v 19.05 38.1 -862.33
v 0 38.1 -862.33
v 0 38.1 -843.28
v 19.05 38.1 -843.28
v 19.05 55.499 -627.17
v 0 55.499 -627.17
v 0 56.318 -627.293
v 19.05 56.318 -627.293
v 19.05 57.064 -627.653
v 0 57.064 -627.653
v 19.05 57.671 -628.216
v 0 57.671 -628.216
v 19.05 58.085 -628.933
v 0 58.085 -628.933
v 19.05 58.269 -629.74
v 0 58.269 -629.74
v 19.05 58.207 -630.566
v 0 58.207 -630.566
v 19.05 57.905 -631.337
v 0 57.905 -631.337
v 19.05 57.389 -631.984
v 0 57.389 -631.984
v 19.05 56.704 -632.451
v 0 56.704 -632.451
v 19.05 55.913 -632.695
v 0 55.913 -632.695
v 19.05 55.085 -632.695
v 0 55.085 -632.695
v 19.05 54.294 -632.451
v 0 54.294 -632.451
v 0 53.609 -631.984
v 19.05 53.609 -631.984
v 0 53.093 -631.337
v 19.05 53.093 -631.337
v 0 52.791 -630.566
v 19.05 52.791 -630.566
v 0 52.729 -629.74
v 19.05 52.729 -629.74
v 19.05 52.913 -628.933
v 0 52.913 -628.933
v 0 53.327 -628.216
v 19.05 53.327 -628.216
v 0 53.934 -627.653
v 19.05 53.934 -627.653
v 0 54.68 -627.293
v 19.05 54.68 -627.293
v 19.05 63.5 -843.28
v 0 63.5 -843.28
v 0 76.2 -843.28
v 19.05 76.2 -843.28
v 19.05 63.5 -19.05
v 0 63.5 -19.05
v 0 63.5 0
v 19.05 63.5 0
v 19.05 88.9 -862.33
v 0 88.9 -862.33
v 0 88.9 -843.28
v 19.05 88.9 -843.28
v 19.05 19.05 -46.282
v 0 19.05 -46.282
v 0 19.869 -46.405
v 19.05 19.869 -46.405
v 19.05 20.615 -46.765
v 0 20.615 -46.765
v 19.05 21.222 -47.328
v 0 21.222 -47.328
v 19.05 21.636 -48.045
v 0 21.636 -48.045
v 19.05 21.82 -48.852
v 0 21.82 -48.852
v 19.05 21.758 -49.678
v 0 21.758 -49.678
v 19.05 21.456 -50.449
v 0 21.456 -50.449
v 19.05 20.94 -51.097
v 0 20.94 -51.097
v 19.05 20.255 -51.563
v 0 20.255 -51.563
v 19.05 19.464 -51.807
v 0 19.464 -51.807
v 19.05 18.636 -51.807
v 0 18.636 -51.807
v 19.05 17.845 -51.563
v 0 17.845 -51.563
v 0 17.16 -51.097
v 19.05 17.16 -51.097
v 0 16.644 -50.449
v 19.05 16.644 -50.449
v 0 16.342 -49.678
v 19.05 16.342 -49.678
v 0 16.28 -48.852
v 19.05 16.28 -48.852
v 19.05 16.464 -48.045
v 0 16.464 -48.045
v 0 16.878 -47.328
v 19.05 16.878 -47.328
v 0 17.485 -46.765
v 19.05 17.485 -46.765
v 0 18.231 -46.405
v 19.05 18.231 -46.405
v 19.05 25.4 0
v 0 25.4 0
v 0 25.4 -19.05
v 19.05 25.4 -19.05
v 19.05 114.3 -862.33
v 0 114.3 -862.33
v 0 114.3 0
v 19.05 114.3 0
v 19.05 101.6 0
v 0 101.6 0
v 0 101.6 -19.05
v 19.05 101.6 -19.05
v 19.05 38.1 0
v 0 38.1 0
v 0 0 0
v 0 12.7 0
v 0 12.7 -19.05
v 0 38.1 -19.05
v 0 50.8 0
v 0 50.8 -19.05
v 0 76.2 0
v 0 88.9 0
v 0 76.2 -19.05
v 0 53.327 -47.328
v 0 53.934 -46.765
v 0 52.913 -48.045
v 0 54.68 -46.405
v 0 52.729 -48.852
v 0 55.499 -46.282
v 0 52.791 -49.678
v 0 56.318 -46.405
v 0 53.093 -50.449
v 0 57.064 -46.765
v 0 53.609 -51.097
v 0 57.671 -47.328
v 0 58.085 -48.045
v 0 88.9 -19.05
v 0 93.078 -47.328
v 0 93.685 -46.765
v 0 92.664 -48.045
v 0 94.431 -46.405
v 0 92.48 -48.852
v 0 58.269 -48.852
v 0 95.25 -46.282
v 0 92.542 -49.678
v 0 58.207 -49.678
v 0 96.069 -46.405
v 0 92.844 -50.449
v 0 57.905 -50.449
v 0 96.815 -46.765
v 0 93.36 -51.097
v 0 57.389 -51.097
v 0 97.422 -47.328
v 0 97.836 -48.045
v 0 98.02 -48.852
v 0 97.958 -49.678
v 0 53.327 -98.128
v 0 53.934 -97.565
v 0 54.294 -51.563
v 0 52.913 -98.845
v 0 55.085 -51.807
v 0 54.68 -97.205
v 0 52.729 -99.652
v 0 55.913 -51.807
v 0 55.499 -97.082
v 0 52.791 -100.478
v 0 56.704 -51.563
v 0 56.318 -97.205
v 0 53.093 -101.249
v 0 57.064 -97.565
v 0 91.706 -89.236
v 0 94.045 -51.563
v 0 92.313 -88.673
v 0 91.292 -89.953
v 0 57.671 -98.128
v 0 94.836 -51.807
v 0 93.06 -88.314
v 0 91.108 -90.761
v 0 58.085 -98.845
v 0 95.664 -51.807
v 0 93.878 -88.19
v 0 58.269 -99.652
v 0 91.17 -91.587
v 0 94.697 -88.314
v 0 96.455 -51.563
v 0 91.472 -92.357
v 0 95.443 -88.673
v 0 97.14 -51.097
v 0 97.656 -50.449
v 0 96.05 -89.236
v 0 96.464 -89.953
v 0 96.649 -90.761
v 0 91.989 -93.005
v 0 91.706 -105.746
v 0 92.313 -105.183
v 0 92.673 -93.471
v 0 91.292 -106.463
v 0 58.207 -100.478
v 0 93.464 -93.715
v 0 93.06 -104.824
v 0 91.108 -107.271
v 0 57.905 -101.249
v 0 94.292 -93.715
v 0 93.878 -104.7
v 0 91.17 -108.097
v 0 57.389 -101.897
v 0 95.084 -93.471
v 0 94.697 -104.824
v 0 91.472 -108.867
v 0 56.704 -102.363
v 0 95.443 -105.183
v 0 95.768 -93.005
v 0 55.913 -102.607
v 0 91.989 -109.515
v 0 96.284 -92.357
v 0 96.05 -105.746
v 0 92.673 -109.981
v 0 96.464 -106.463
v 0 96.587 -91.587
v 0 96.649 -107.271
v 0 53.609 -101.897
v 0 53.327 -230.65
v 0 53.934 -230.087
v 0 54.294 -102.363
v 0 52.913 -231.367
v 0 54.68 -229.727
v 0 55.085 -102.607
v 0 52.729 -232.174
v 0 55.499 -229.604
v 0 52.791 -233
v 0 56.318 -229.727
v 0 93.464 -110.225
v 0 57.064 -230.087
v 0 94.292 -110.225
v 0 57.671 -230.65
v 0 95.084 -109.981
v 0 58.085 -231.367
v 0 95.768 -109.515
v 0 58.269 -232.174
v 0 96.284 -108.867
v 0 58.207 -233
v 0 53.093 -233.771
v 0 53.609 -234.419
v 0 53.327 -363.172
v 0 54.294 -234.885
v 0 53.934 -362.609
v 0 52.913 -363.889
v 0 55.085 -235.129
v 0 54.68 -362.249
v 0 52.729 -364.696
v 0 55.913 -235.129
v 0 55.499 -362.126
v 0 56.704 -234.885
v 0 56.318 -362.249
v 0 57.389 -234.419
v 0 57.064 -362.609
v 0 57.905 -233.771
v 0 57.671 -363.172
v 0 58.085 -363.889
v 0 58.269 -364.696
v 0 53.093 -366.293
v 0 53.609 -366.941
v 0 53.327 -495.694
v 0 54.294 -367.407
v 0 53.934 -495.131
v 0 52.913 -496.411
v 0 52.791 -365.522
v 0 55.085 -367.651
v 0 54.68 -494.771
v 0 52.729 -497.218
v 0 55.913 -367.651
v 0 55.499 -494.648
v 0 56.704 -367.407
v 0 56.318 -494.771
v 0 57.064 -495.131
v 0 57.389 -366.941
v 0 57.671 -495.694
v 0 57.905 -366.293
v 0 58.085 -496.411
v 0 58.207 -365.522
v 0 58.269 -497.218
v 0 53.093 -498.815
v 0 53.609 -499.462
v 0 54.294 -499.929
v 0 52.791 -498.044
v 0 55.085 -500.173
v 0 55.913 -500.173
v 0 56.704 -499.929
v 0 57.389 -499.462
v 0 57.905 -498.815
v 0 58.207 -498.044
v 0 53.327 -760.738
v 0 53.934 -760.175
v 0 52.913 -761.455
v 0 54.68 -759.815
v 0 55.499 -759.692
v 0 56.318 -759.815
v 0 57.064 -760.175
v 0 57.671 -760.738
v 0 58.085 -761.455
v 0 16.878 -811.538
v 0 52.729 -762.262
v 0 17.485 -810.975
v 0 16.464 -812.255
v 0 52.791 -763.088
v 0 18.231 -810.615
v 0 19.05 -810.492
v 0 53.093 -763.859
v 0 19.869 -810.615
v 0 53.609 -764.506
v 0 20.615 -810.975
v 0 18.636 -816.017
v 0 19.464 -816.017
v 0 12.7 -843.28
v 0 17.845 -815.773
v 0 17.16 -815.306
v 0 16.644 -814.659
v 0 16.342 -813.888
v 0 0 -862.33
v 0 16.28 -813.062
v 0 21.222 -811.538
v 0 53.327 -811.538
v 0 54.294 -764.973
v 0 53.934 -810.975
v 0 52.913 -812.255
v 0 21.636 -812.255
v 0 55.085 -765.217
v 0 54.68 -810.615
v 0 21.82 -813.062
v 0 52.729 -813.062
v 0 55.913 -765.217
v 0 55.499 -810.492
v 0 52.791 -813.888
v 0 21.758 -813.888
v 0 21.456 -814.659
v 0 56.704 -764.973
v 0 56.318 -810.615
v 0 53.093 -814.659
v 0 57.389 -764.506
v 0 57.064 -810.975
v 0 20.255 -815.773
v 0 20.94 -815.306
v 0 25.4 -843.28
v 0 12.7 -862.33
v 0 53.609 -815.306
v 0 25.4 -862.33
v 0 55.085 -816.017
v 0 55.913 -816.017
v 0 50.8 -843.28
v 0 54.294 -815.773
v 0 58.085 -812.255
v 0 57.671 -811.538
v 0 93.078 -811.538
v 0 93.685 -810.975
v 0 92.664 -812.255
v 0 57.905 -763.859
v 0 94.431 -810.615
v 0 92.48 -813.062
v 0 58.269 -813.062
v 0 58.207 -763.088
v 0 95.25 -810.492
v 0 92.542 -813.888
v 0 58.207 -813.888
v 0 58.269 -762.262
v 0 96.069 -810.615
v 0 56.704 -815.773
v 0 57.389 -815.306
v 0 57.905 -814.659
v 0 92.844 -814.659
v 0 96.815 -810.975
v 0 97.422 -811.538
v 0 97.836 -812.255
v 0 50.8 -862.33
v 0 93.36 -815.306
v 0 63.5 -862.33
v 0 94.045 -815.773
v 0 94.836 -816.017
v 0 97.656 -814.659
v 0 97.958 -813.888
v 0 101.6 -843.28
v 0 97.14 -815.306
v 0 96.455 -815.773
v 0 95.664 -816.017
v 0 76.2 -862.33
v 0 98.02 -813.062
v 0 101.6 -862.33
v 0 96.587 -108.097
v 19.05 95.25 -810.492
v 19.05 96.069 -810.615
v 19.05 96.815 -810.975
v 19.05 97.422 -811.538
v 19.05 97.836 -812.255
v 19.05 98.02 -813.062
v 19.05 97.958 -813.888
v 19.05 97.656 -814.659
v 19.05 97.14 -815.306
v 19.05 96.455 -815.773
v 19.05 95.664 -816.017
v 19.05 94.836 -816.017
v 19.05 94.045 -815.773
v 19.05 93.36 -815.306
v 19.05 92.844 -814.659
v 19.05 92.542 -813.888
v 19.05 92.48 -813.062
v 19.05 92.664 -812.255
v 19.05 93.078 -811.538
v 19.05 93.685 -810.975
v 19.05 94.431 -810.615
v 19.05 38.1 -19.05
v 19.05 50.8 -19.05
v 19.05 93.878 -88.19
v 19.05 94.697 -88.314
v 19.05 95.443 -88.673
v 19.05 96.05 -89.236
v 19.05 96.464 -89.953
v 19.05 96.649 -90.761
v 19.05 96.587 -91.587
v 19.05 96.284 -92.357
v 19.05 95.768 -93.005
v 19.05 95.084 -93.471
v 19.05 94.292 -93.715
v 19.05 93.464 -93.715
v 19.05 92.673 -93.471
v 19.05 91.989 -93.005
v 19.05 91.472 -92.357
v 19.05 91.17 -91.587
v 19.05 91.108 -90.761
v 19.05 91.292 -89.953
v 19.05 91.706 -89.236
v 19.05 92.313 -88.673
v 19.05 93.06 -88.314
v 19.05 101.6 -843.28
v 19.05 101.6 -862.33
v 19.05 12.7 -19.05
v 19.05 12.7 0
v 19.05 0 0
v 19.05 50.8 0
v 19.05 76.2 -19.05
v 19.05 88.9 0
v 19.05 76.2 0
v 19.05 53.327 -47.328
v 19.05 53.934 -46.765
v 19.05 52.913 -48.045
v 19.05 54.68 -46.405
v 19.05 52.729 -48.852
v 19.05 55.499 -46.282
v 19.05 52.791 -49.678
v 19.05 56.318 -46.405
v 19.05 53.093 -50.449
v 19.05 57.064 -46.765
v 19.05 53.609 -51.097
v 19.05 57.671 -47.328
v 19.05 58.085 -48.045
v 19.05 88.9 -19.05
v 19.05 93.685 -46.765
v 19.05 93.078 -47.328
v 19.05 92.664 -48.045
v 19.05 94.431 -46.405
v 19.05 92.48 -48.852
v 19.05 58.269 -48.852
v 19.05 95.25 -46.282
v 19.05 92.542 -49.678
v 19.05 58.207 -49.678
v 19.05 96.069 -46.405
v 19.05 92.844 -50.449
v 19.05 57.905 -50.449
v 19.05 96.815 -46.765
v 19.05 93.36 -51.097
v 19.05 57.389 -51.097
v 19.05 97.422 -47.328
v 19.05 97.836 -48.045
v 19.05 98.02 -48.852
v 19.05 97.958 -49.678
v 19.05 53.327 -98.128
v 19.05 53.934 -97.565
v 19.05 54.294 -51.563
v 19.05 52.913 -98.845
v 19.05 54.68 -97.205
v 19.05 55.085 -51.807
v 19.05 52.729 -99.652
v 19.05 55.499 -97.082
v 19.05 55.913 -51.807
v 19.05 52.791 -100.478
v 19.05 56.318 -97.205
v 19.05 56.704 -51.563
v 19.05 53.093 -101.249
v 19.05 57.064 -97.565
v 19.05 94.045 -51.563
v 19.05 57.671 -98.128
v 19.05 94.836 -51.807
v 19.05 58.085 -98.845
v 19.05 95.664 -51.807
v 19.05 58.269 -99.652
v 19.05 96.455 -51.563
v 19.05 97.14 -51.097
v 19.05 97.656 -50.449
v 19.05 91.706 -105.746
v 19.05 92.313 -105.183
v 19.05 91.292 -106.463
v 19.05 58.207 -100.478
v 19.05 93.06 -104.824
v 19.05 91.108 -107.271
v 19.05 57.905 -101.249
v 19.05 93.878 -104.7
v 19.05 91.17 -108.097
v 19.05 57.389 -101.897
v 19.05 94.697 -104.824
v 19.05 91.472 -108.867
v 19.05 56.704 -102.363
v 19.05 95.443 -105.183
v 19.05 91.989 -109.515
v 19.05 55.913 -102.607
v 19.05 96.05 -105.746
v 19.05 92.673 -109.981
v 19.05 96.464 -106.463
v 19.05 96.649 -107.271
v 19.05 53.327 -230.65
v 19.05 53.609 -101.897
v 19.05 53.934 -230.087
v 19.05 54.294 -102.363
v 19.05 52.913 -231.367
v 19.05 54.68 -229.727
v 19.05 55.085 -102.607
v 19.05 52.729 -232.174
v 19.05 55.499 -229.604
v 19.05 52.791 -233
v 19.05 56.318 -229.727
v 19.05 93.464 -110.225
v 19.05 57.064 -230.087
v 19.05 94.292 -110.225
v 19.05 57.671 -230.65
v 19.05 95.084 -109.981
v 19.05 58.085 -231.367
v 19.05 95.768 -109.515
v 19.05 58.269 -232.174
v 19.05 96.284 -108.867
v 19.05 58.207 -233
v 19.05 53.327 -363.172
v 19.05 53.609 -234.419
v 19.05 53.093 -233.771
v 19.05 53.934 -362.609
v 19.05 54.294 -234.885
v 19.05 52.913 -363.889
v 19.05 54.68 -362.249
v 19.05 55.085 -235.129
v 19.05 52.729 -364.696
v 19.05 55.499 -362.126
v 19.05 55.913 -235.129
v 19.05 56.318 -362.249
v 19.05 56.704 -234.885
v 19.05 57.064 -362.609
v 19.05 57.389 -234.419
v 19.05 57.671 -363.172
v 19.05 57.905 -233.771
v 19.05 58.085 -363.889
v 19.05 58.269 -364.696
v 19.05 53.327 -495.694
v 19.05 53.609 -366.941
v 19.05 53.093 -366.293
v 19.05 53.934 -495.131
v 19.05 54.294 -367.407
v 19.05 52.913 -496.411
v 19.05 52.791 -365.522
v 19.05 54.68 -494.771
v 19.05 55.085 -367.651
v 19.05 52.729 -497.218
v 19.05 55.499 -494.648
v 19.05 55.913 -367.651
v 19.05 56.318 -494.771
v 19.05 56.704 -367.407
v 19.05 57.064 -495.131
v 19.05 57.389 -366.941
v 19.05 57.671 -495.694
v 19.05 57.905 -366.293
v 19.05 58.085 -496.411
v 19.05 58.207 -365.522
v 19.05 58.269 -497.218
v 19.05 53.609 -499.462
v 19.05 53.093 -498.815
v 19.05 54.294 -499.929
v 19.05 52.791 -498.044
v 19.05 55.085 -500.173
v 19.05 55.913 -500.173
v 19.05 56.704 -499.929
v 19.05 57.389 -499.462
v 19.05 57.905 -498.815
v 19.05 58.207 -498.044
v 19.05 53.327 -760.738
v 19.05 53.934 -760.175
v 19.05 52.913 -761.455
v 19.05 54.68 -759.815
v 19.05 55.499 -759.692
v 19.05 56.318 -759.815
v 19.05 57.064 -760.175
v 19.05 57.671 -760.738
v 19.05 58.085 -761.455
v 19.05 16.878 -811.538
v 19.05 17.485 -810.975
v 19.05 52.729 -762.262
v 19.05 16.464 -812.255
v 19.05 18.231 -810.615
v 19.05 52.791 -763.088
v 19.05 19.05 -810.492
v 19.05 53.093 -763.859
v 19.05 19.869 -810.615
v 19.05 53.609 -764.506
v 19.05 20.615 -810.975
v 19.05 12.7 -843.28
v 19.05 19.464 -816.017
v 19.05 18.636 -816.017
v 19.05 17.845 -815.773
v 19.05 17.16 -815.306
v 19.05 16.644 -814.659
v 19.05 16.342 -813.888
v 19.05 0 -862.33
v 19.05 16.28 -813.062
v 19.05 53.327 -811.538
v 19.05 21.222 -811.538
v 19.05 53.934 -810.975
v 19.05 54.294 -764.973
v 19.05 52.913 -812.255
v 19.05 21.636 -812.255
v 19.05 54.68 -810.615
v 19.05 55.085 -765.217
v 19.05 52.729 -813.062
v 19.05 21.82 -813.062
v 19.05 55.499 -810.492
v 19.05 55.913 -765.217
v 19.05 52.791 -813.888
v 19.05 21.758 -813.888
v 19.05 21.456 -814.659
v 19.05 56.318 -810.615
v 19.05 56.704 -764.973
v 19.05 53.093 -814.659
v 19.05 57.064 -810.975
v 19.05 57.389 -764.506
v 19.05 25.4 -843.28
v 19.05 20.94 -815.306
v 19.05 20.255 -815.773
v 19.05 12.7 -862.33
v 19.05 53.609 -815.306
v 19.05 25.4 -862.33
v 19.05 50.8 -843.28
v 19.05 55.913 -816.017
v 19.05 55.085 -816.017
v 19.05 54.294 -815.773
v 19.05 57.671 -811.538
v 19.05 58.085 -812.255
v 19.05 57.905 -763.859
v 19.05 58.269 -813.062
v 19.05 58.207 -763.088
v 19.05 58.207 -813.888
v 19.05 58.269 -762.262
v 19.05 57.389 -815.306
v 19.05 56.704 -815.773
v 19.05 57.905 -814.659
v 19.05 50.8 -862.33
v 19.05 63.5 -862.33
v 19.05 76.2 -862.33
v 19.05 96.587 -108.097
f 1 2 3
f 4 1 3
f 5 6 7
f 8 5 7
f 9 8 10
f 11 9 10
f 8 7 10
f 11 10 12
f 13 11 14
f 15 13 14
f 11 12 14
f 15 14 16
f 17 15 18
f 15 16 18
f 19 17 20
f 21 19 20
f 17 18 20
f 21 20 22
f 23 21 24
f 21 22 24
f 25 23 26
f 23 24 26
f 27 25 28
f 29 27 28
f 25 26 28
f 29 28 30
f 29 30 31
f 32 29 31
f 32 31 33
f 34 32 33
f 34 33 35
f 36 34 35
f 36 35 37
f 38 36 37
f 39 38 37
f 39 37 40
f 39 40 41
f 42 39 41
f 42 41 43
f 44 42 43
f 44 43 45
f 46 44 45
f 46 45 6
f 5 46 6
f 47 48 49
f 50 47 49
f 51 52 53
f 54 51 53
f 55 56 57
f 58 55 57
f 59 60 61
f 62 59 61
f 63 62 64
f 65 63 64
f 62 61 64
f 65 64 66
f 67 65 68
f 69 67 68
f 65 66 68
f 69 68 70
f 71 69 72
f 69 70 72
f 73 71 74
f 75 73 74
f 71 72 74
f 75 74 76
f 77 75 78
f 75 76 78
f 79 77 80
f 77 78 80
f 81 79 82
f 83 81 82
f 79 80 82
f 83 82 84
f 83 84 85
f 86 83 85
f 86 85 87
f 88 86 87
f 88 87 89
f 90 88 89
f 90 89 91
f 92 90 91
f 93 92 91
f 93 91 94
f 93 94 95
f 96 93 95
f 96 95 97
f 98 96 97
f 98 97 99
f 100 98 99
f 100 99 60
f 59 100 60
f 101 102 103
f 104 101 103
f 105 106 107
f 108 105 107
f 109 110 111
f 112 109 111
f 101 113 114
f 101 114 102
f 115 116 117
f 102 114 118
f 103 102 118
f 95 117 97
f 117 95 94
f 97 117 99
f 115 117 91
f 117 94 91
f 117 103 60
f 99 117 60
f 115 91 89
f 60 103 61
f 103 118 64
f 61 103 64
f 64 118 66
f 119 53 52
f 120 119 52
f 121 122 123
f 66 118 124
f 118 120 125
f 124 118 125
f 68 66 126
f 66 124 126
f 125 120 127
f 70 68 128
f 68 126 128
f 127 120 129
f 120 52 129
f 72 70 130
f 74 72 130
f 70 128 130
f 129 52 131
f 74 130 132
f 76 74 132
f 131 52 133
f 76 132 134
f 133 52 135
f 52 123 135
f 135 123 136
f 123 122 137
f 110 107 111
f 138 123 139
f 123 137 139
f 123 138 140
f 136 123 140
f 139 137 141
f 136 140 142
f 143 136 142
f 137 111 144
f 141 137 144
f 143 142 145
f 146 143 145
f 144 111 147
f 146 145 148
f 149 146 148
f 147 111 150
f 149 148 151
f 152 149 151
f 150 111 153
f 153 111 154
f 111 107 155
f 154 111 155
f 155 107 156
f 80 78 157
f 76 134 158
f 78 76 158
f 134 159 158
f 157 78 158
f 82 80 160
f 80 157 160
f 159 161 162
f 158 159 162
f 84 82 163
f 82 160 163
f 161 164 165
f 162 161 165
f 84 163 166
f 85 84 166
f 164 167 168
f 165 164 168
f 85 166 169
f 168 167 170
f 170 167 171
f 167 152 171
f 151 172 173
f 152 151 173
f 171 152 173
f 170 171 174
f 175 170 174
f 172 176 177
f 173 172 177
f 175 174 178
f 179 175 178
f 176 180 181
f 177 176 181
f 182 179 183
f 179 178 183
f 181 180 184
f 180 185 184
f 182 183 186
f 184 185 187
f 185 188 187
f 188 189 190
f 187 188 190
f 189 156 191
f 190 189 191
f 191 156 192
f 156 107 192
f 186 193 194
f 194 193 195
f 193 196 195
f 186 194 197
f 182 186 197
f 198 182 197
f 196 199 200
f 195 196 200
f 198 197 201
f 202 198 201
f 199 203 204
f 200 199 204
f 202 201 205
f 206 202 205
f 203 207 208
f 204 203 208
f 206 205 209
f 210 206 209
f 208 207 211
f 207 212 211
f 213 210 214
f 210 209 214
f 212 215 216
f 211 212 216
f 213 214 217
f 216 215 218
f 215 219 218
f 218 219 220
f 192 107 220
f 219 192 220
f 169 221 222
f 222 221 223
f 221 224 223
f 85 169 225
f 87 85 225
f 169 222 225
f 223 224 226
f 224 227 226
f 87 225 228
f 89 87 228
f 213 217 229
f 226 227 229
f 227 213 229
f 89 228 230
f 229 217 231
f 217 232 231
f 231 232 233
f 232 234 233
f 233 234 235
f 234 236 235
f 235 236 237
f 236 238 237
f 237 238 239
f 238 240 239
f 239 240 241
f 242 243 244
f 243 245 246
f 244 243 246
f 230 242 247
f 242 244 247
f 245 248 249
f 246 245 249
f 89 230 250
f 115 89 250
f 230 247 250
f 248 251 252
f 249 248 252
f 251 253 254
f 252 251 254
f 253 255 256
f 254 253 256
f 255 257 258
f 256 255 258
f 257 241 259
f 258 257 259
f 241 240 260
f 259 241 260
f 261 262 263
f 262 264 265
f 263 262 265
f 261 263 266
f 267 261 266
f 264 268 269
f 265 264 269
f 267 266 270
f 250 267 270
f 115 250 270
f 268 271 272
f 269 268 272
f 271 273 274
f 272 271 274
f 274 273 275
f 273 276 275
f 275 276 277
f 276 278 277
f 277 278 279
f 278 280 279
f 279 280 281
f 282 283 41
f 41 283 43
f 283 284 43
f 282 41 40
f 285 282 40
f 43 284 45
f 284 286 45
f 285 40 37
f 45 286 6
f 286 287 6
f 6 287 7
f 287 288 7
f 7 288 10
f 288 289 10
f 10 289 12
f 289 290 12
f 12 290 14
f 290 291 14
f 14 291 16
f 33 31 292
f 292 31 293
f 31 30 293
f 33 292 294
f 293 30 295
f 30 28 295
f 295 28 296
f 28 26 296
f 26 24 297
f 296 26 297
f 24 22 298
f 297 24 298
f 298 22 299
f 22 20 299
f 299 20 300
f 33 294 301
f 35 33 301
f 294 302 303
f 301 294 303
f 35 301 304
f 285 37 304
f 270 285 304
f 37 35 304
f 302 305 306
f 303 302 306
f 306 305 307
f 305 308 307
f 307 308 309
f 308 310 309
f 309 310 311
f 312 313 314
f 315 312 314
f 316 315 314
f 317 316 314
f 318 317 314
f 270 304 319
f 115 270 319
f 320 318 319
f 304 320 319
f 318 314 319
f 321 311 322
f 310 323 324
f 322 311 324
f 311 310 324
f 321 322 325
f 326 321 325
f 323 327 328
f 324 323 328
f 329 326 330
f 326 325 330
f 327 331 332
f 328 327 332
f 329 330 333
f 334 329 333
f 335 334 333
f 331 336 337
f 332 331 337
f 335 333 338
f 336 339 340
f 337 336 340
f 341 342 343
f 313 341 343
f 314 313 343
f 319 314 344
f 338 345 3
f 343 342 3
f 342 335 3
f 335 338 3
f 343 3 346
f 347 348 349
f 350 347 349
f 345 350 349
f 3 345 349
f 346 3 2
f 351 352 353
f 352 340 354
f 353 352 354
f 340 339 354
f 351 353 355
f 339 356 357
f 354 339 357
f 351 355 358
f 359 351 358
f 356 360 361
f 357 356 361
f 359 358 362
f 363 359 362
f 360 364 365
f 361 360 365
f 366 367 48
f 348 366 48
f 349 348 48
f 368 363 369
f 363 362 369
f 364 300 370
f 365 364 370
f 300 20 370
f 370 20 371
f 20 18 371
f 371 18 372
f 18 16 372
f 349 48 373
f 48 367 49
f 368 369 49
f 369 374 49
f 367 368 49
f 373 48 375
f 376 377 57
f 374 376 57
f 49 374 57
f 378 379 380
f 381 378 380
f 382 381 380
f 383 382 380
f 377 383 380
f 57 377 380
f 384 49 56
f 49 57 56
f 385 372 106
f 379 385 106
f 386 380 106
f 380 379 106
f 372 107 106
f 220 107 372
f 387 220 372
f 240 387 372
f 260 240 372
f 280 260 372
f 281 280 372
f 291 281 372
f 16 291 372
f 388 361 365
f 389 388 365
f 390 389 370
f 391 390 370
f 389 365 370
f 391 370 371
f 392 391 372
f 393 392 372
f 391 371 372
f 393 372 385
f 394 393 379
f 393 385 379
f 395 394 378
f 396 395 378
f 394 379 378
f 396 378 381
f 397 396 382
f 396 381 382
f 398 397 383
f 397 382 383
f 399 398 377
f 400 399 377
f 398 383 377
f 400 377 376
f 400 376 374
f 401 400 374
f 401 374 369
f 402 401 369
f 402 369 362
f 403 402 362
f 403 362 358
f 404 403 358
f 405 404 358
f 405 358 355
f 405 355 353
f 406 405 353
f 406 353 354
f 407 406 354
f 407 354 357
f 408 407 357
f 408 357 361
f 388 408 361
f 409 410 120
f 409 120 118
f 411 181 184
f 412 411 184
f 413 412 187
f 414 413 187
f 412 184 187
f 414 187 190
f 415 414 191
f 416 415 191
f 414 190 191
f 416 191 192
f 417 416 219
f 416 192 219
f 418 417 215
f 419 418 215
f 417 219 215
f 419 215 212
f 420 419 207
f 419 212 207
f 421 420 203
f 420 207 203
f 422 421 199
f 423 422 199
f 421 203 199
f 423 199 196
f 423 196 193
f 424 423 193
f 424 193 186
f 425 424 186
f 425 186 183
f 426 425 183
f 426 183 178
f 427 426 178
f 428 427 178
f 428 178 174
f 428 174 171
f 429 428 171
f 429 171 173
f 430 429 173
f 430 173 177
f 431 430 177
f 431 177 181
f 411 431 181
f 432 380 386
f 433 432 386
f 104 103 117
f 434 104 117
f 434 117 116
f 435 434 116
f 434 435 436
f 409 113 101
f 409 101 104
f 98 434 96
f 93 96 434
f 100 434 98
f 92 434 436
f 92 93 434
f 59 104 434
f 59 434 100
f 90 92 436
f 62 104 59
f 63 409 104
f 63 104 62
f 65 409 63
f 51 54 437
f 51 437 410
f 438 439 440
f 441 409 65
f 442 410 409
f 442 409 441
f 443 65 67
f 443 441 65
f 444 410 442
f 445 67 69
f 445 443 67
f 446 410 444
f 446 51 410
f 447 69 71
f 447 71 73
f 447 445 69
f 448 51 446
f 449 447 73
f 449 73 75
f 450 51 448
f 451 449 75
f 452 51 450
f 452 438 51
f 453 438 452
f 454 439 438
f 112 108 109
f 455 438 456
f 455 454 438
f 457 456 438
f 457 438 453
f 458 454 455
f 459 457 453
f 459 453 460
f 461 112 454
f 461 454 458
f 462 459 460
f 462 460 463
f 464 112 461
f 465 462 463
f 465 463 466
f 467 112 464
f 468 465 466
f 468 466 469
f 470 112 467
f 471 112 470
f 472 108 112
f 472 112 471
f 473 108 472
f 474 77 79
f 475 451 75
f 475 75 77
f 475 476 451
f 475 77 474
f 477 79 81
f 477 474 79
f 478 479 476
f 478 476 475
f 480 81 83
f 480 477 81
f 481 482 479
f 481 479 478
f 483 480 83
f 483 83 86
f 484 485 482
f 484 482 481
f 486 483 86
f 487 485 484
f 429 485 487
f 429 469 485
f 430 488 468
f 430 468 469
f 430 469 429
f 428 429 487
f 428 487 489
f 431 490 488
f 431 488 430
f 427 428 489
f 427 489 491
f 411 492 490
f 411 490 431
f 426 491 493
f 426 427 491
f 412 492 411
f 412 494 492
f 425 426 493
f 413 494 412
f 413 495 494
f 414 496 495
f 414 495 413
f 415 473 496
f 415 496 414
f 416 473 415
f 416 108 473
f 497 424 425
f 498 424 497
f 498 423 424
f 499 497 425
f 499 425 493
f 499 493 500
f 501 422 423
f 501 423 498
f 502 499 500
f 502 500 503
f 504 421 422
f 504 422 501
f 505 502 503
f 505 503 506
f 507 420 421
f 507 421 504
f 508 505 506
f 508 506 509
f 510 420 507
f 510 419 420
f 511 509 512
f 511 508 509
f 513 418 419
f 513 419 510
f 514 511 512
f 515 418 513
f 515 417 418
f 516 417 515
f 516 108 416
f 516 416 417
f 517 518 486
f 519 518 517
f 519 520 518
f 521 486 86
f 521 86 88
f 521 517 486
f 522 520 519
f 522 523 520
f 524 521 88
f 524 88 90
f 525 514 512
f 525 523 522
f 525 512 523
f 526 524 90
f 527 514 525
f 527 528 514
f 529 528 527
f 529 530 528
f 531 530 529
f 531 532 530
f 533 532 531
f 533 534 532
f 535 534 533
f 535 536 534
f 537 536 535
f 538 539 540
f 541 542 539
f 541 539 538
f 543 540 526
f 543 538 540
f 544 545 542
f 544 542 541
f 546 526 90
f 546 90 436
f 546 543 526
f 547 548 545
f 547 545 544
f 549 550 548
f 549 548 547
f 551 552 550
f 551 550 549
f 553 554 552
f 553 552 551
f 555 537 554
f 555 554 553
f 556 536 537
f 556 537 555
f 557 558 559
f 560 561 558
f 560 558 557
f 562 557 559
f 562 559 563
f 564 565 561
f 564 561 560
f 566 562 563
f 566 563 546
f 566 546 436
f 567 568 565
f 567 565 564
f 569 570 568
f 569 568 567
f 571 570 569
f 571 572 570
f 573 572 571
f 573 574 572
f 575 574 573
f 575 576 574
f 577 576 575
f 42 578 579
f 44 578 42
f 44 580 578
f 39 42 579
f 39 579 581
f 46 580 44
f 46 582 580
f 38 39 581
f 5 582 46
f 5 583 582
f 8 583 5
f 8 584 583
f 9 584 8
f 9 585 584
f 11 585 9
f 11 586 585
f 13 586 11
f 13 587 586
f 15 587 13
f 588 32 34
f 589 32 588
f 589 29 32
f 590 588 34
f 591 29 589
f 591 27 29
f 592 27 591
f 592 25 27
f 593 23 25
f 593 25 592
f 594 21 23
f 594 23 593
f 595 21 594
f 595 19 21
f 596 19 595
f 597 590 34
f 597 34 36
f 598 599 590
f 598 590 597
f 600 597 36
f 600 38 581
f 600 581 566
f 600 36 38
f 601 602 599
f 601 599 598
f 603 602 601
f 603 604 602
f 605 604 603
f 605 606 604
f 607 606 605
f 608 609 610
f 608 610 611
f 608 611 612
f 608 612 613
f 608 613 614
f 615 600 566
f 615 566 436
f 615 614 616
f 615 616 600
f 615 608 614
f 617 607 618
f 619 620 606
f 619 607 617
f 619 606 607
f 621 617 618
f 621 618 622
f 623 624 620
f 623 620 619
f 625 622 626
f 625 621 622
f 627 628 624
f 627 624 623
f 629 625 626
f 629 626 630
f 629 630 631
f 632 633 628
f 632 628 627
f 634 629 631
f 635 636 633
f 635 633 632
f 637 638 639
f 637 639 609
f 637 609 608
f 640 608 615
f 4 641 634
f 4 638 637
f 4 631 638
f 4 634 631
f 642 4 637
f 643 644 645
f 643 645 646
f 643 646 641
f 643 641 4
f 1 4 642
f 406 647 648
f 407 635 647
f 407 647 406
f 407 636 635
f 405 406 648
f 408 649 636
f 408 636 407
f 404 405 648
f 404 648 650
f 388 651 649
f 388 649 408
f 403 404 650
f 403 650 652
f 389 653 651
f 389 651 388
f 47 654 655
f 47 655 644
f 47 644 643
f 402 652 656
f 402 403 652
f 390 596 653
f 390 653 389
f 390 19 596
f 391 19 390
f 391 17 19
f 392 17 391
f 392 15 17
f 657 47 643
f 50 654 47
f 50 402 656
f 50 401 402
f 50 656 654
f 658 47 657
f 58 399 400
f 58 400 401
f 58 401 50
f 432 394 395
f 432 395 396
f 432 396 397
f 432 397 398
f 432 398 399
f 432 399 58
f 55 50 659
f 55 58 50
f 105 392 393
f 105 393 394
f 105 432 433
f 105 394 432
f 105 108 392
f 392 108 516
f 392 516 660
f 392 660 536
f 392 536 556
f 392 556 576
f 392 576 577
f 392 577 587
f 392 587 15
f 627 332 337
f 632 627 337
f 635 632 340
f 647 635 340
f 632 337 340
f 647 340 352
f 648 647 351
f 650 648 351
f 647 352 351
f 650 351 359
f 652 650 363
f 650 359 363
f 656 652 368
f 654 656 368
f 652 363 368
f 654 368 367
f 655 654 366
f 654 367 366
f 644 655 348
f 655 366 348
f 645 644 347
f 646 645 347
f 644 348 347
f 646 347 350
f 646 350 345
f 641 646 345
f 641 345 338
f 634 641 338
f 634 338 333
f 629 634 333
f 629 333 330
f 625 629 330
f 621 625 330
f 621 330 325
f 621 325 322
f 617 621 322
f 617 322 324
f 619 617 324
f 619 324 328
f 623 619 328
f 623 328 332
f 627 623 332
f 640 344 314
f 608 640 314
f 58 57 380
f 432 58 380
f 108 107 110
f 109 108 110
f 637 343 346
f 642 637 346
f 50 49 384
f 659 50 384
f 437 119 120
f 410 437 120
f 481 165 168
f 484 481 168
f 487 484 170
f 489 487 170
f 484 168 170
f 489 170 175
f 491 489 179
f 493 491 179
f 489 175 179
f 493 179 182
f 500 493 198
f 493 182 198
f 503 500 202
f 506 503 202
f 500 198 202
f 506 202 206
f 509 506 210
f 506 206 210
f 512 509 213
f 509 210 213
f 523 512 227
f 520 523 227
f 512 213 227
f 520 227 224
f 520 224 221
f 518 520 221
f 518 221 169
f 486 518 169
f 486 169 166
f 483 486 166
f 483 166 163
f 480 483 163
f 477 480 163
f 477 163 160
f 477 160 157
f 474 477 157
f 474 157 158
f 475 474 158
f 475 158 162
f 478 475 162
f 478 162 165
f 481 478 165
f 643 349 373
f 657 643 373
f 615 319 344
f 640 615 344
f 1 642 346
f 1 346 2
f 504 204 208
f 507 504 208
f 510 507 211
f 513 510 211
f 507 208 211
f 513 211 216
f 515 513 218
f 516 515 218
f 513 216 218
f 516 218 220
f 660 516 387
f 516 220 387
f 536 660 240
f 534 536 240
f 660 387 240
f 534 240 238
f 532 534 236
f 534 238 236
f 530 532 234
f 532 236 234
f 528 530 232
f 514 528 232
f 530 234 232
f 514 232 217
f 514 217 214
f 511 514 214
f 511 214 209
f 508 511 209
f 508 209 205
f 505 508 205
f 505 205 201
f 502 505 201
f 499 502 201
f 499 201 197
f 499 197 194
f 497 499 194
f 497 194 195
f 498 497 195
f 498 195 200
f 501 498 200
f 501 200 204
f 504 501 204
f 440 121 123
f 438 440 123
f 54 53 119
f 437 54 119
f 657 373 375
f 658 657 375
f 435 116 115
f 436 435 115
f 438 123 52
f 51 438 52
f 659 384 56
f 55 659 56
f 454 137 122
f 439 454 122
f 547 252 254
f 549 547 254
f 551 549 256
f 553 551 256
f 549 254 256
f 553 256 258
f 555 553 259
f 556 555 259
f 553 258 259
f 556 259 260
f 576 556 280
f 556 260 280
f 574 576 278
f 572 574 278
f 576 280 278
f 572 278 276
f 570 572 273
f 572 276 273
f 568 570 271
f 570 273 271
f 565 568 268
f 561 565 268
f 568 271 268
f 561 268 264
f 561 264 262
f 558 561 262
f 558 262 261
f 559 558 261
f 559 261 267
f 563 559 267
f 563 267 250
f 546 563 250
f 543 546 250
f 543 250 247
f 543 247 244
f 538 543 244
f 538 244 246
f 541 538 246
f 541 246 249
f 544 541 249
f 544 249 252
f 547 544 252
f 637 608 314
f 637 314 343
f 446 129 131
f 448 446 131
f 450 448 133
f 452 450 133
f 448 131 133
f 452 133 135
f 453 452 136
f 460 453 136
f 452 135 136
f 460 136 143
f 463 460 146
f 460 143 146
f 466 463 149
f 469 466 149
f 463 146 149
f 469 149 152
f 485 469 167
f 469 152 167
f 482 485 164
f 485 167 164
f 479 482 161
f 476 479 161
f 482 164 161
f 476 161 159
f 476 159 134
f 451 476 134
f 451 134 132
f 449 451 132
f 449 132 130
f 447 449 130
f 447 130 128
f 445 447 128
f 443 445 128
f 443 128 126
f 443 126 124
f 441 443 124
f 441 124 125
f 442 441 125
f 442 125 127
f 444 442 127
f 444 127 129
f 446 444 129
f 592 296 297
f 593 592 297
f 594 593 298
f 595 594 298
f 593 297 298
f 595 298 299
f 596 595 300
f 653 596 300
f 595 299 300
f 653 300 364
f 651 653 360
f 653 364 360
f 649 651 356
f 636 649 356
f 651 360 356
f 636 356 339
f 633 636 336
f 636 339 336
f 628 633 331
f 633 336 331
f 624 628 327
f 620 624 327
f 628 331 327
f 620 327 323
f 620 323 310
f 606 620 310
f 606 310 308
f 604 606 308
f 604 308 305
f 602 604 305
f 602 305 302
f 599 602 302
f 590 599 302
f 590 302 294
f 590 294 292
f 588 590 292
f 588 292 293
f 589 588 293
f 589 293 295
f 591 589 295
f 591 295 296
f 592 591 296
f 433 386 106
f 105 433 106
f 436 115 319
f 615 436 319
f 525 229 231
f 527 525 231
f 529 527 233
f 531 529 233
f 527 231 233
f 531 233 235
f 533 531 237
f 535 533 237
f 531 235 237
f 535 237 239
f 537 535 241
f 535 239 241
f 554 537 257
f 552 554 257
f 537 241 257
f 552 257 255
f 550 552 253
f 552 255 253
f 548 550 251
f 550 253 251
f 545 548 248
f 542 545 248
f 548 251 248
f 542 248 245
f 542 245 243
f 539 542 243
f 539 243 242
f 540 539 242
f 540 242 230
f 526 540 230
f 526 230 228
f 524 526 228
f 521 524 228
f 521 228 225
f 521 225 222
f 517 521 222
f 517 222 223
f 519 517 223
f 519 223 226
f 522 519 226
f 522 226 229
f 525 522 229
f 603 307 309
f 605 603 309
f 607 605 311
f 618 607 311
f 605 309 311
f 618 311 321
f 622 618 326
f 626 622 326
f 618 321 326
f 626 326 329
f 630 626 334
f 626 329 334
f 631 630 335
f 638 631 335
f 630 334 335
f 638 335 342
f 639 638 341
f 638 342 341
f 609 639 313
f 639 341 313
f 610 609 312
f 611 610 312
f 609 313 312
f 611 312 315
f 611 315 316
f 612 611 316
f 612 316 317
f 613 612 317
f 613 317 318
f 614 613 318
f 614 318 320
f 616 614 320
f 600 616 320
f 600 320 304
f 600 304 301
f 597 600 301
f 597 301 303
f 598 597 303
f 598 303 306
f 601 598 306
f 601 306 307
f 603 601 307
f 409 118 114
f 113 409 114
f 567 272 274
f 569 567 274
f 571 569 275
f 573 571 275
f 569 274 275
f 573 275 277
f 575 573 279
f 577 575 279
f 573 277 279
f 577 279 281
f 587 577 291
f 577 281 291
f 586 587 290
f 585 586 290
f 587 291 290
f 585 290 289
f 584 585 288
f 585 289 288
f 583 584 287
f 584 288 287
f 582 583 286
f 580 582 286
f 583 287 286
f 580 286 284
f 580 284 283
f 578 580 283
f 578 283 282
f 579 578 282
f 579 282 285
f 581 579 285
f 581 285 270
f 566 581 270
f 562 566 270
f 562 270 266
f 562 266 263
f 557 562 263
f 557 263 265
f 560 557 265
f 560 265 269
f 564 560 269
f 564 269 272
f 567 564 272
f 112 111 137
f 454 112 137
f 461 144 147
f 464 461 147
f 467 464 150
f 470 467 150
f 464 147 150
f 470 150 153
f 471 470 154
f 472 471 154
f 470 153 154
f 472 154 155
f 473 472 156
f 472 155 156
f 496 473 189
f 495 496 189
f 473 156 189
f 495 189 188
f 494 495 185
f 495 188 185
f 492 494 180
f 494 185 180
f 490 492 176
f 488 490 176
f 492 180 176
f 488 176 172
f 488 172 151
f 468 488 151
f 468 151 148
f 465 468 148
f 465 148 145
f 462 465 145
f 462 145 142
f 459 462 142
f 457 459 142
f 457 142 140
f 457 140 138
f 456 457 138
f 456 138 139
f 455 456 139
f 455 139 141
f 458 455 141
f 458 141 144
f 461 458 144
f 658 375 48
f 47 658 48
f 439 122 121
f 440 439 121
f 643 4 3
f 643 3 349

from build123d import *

# Parameters (mm, degrees)
BOSS_EXTRUDE1_DEPTH             = 19.05
F_7_32_0_21875_DIAMETER_HOLE2_D = 5.55625


with BuildPart() as part:
    # Sketch1 → Boss-Extrude1 (new body)
    with BuildSketch(Plane(origin=(0, 0, 0), x_dir=(0, 0, -1), z_dir=(1, 0, 0))):
        Polygon((0, 0), (862.33, 0), (862.33, 12.7), (843.28, 12.7), (843.28, 25.4), (862.33, 25.4), (862.33, 38.1), (843.28, 38.1), (843.28, 50.8), (862.33, 50.8), (862.33, 63.5), (843.28, 63.5), (843.28, 76.2), (862.33, 76.2), (862.33, 88.9), (843.28, 88.9), (843.28, 101.6), (862.33, 101.6), (862.33, 114.3), (0, 114.3), (0, 101.6), (19.05, 101.6), (19.05, 88.9), (0, 88.9), (0, 76.2), (19.05, 76.2), (19.05, 63.5), (0, 63.5), (0, 50.8), (19.05, 50.8), (19.05, 38.1), (0, 38.1), (0, 25.4), (19.05, 25.4), (19.05, 12.7), (0, 12.7), align=None)
    extrude(amount=BOSS_EXTRUDE1_DEPTH)

    # 7/32 (0.21875) Diameter Hole2 (through all)
    with Locations(Plane(origin=(19.05, 0, 0), x_dir=(0, 0, -1), z_dir=(1, 0, 0))):
        with Locations((49.0601, 55.499), (99.8601, 55.499), (232.38206, 55.499), (364.90402, 55.499), (497.42598, 55.499), (629.94794, 55.499), (762.4699, 55.499), (813.2699, 55.499), (813.2699, 95.25), (813.2699, 19.05), (49.0601, 95.25), (49.0601, 19.05), (90.968322508, 93.8784), (107.478322508, 93.8784)):
            Hole(F_7_32_0_21875_DIAMETER_HOLE2_D / 2)


solid = part.part
